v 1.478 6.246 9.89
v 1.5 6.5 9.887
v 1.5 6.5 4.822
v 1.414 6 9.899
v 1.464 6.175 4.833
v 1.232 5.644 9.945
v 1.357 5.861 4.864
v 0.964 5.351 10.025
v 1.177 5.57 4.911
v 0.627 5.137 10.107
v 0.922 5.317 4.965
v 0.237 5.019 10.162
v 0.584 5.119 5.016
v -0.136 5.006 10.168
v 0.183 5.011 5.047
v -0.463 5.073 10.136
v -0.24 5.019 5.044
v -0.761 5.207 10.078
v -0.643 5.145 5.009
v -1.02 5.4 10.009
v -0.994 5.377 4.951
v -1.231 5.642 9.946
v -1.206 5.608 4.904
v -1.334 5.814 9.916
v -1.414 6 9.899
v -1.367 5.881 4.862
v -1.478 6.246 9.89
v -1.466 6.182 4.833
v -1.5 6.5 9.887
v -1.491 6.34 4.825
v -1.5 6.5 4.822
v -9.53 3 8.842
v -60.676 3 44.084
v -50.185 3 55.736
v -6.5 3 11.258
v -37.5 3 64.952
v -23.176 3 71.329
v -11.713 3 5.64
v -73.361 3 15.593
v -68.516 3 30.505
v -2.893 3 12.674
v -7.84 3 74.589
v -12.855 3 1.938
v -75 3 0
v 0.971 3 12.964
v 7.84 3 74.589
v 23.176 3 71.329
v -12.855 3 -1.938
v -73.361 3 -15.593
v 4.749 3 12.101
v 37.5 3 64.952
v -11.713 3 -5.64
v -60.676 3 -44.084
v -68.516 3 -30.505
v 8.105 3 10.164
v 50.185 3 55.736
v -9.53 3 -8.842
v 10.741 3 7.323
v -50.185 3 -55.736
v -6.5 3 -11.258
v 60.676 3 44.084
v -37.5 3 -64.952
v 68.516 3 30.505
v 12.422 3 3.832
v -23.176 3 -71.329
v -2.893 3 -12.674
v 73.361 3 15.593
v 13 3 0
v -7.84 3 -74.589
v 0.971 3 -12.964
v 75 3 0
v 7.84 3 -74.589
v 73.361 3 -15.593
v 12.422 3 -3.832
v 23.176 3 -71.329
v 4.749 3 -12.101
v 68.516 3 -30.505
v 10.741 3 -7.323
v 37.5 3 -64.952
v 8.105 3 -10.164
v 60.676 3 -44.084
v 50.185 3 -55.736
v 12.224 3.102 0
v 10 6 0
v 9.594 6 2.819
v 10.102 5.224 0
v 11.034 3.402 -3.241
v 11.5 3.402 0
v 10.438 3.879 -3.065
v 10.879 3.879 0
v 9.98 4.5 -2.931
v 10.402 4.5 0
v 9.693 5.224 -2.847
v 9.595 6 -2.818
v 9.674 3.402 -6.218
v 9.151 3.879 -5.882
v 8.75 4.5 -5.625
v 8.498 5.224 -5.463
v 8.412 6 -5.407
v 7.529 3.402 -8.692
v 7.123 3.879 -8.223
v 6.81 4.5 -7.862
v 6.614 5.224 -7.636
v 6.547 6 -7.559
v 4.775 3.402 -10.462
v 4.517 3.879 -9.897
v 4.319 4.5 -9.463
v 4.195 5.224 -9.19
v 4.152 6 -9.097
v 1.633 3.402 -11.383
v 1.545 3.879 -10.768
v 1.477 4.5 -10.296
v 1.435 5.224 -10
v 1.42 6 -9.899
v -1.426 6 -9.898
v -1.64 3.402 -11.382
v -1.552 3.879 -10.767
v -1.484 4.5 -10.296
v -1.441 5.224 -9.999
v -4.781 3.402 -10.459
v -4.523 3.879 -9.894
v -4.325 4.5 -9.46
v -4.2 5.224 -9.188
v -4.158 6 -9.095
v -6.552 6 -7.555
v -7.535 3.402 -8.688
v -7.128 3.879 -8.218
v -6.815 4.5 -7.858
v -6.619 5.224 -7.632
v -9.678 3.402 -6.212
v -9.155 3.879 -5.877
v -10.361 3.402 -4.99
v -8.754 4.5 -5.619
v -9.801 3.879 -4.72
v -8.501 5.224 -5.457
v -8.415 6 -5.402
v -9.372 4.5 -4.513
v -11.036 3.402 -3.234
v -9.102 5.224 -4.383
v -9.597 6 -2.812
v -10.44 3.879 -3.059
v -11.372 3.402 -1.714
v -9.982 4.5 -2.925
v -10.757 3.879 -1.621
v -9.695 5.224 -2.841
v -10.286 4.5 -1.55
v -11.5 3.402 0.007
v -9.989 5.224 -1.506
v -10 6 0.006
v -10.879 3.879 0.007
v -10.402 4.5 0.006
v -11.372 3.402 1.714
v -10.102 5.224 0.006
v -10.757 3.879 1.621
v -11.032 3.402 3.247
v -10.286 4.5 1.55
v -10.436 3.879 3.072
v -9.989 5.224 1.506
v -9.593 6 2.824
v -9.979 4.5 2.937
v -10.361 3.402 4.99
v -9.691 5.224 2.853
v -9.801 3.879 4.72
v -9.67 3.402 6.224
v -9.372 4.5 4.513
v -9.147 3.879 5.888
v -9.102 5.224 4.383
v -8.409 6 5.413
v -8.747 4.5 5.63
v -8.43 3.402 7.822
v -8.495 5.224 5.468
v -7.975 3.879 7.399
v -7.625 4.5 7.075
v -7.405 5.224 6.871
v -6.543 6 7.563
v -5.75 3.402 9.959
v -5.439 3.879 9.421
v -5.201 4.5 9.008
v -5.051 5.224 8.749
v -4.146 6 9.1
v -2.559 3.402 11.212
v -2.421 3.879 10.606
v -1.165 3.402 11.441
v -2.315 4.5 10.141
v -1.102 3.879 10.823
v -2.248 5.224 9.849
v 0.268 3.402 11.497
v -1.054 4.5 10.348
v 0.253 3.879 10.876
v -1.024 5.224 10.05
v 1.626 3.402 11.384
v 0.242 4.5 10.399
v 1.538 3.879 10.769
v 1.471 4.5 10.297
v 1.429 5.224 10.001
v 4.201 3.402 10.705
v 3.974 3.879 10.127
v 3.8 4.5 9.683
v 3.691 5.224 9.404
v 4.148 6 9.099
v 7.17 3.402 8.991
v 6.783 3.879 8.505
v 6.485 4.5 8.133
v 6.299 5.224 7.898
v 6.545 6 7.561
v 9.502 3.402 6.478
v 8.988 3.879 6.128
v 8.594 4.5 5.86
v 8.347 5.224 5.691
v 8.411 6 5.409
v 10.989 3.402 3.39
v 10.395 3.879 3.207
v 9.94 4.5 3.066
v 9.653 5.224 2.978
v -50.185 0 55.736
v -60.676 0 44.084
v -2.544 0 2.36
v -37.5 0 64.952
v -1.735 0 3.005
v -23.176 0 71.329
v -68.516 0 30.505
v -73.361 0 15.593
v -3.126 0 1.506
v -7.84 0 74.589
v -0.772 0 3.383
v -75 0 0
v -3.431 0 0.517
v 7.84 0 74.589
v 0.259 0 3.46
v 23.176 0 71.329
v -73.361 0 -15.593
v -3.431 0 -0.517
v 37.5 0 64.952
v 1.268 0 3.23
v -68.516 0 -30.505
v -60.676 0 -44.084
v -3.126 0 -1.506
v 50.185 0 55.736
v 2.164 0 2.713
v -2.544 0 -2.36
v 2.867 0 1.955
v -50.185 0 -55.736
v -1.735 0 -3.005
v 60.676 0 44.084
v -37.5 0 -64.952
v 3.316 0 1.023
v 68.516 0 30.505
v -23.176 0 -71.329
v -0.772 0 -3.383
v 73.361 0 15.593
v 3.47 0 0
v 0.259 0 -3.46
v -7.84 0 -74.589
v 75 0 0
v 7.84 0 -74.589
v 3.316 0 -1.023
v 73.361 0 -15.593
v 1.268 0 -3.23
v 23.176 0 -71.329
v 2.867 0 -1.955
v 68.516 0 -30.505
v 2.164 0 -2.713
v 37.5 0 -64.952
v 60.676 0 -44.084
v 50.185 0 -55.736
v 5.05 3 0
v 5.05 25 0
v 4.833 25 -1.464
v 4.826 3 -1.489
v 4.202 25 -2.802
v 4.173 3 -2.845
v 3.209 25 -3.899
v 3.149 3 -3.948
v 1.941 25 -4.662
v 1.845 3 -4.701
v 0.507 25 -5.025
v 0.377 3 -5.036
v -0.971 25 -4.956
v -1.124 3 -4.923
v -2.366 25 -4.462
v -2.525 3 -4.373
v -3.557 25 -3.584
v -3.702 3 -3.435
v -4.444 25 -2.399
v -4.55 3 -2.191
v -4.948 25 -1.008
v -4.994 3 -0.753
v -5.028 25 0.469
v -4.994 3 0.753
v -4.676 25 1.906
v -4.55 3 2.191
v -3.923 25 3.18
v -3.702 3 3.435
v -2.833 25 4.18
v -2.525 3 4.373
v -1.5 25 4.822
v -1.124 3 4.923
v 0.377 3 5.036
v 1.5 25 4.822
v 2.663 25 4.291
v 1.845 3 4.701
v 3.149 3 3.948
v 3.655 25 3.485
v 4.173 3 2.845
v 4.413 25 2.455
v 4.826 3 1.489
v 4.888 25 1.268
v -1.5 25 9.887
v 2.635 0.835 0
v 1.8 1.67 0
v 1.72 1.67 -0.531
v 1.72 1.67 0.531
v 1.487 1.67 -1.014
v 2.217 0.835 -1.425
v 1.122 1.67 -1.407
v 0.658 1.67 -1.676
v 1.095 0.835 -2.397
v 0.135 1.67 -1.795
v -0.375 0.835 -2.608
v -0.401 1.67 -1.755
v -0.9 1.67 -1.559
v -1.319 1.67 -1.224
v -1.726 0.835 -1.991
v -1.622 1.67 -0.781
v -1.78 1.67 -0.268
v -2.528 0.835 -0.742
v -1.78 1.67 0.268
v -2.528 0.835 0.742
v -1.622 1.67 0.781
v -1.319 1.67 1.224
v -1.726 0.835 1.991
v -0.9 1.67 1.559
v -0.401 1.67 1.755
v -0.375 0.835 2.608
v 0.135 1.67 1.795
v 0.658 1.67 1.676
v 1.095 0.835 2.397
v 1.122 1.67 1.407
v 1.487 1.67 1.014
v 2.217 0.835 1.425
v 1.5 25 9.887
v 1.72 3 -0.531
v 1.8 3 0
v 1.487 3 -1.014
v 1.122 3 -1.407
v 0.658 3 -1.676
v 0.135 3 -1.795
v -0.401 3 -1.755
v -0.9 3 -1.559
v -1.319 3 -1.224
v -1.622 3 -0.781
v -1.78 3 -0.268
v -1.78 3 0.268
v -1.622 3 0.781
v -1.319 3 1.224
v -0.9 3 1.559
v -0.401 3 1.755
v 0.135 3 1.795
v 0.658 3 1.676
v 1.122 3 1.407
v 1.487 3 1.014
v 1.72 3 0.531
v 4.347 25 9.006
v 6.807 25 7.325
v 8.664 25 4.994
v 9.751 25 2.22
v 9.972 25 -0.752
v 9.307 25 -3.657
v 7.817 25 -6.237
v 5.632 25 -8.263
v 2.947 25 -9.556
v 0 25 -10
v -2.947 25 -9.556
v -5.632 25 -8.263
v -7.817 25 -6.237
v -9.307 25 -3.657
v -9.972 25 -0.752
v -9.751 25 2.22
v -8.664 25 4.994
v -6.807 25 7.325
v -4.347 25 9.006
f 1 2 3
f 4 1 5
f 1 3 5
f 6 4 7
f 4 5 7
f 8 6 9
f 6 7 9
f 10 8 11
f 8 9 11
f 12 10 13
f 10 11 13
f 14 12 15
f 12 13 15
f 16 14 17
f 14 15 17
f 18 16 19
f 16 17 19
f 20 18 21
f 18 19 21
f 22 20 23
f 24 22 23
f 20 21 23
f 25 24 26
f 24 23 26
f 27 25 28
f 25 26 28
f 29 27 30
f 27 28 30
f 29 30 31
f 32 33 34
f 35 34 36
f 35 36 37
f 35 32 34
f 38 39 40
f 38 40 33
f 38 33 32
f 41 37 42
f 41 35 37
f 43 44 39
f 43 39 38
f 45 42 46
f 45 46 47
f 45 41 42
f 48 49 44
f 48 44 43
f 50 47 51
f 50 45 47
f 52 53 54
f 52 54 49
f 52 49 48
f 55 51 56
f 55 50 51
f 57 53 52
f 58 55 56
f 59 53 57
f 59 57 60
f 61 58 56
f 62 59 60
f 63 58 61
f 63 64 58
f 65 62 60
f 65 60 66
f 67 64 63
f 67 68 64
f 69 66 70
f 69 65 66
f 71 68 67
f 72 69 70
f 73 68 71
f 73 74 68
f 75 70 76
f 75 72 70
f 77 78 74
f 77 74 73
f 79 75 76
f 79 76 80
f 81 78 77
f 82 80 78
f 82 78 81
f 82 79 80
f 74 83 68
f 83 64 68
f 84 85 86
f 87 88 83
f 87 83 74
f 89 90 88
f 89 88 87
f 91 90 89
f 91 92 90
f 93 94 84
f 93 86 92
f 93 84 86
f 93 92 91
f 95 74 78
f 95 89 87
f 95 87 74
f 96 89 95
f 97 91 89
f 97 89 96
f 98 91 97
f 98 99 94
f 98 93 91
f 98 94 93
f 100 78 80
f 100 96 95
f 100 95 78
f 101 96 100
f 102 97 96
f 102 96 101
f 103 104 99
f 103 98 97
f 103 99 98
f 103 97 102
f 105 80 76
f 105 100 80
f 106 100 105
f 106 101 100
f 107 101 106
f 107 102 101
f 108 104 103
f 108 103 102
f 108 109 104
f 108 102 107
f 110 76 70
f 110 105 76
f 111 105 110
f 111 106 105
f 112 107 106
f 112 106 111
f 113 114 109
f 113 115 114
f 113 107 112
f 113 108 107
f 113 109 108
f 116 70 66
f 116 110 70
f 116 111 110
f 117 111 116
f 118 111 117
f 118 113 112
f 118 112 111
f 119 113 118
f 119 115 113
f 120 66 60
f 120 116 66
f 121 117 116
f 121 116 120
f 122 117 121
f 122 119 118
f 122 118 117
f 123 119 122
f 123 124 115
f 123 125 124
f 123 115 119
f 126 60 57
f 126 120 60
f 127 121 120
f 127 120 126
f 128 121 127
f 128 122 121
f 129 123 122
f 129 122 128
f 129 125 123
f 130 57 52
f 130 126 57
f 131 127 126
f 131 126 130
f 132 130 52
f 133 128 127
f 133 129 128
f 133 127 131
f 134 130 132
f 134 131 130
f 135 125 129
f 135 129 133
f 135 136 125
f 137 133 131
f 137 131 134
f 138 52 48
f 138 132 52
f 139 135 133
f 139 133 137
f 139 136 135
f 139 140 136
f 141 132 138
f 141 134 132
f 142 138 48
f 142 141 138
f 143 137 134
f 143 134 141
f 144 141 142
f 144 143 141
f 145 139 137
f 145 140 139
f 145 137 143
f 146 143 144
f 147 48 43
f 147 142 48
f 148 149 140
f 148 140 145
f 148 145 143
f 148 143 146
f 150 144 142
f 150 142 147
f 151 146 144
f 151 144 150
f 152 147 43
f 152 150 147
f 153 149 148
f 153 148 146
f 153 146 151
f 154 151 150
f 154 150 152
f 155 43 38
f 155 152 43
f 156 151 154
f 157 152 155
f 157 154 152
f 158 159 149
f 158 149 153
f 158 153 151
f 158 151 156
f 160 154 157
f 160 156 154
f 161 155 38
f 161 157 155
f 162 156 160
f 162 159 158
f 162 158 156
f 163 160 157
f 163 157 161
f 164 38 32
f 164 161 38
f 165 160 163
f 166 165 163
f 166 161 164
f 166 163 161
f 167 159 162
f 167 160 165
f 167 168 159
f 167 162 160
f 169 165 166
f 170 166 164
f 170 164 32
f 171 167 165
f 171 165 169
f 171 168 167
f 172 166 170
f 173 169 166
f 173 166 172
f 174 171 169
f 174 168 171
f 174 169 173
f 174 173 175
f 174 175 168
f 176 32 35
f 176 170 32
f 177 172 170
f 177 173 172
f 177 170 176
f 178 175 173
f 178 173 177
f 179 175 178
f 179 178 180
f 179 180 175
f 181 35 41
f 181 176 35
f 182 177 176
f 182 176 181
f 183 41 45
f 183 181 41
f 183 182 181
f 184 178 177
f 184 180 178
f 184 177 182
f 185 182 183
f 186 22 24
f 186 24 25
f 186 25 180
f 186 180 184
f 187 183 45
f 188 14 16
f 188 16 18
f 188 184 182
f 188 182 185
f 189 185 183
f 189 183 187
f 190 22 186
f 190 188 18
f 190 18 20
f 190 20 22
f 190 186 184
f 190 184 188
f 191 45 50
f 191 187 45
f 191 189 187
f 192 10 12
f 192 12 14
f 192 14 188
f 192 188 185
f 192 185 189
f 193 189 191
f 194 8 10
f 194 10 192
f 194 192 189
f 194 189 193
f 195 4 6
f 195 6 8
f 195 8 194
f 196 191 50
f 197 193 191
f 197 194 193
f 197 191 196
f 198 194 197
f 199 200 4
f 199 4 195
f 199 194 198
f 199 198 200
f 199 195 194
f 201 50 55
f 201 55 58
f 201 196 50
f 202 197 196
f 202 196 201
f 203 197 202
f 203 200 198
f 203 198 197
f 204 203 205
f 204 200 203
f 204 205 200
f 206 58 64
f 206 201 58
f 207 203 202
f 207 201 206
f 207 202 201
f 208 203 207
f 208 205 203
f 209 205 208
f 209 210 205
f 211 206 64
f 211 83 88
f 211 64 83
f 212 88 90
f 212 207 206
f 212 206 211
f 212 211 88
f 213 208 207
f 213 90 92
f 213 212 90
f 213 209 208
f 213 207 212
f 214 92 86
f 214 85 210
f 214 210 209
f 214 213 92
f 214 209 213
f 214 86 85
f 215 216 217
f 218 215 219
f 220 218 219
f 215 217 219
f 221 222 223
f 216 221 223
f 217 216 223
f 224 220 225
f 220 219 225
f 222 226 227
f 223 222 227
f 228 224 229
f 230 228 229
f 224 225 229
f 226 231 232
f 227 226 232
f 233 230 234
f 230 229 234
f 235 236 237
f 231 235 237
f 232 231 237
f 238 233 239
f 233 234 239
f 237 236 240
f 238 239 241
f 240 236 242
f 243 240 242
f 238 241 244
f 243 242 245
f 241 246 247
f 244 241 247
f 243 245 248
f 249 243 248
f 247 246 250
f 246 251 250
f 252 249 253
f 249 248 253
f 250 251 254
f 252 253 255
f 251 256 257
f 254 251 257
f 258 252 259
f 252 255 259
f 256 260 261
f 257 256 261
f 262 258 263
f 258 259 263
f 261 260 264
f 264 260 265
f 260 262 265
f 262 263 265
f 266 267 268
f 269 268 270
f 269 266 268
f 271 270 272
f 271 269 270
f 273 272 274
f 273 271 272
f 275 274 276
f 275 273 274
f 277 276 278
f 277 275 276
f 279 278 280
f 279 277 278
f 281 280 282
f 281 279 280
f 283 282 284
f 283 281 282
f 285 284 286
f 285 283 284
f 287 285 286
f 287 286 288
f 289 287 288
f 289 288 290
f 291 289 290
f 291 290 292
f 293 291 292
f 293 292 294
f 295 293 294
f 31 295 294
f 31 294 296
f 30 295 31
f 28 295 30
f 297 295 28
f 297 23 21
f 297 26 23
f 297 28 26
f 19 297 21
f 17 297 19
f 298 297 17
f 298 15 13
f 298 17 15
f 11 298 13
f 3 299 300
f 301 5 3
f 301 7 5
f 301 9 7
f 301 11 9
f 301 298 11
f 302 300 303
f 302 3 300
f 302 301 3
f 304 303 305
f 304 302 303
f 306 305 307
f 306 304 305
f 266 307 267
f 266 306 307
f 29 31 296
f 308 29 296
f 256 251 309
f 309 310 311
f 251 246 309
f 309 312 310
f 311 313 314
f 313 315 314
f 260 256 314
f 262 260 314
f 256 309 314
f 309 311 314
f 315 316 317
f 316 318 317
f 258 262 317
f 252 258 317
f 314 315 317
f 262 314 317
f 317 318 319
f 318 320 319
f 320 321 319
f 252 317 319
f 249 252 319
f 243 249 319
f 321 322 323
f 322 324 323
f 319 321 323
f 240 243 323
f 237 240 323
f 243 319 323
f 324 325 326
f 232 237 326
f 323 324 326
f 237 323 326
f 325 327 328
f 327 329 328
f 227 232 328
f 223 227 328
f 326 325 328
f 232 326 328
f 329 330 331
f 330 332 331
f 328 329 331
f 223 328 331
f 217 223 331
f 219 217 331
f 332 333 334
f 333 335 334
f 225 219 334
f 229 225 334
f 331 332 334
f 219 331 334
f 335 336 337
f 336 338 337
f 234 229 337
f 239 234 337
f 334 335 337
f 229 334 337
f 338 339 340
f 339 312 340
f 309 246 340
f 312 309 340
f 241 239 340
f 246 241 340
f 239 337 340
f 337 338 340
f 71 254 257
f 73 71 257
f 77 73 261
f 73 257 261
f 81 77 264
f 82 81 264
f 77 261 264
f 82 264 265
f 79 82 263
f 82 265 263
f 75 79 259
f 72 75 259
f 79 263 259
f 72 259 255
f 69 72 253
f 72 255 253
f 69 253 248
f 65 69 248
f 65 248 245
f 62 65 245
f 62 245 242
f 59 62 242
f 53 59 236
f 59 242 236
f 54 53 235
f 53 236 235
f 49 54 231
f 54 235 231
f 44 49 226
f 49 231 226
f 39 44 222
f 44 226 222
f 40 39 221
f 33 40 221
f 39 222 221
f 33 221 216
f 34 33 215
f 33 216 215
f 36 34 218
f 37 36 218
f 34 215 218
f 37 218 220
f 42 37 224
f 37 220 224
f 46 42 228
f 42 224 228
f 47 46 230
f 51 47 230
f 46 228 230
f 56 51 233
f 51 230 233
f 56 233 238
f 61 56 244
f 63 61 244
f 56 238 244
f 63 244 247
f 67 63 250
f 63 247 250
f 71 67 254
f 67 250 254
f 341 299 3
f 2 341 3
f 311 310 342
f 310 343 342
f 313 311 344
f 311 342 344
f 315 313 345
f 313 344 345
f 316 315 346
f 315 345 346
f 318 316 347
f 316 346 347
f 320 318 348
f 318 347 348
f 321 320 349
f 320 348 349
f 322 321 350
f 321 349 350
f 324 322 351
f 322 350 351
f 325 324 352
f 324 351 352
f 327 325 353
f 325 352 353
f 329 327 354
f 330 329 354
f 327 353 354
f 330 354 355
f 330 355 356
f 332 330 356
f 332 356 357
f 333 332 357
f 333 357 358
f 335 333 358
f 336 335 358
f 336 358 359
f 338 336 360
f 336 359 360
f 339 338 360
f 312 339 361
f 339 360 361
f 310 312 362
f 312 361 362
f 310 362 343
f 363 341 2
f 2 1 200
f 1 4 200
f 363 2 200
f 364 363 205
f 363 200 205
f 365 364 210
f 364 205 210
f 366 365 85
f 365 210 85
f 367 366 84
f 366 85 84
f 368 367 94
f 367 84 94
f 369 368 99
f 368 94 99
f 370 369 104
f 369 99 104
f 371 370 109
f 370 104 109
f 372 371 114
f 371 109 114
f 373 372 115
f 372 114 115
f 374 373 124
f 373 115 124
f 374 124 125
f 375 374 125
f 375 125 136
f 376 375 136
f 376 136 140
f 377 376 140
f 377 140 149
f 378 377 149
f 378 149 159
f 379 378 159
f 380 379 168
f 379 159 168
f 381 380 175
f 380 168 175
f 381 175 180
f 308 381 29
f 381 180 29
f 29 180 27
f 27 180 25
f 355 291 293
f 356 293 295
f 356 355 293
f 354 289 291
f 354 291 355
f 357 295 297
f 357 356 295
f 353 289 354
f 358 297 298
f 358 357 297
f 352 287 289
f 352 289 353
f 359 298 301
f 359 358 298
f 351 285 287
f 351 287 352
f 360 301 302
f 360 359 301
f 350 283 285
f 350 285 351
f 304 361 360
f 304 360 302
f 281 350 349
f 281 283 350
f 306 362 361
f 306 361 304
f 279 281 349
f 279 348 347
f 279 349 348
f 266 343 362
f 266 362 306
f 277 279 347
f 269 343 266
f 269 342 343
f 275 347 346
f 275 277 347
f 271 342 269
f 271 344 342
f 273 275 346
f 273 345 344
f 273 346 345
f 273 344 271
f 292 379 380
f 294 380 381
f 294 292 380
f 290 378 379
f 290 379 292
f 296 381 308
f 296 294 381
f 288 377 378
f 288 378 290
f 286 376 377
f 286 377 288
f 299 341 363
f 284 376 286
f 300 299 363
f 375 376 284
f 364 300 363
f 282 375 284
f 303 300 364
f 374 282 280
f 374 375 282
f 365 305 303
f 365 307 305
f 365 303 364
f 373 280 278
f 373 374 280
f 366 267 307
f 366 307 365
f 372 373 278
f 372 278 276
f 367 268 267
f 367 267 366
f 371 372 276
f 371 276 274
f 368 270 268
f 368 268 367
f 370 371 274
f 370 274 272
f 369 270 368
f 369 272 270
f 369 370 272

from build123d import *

# Parameters (mm, degrees)
SKETCH1_R                                            = 75
BOSS_EXTRUDE1_DEPTH                                  = 3
SKETCH2_R                                            = 10
SKETCH2_R_2                                          = 5.05
BOSS_EXTRUDE2_DEPTH                                  = 22
FILLET1_R                                            = 3
CUT_EXTRUDE1_DEPTH                                   = 76
CSK_FOR_M3_HEX_SOCKET_COUNTERSUNK_HEAD_S_D           = 3.6
CSK_FOR_M3_HEX_SOCKET_COUNTERSUNK_HEAD_S_CSINK_D     = 6.94
CSK_FOR_M3_HEX_SOCKET_COUNTERSUNK_HEAD_S_CSINK_ANGLE = 90


with BuildPart() as part:
    # Sketch1 → Boss-Extrude1 (new body)
    with BuildSketch(Plane(origin=(0, 0, 0), x_dir=(1, 0, 0), z_dir=(0, 1, 0))):
        Circle(SKETCH1_R)
    extrude(amount=BOSS_EXTRUDE1_DEPTH)

    # Sketch2 → Boss-Extrude2 (add)
    with BuildSketch(Plane(origin=(0, 3, 0), x_dir=(1, 0, 0), z_dir=(0, 1, 0))):
        Circle(SKETCH2_R)
        Circle(SKETCH2_R_2, mode=Mode.SUBTRACT)
    extrude(amount=BOSS_EXTRUDE2_DEPTH)

    # Fillet1
    fillet1_edges = [part.edges().sort_by_distance(p)[0] for p in [
        (-10, 3, 0),
    ]]
    fillet(fillet1_edges, radius=FILLET1_R)

    # Sketch3 → Cut-Extrude1 (cut, through all)
    with BuildSketch(Plane.XY):
        with BuildLine():
            Line((1.5, 25), (1.5, 6.5))
            ThreePointArc((1.5, 6.5), (0, 5), (-1.5, 6.5))
            Line((-1.5, 6.5), (-1.5, 25))
            ThreePointArc((-1.5, 25), (0, 26.5), (1.5, 25))
        make_face()
    extrude(amount=CUT_EXTRUDE1_DEPTH, mode=Mode.SUBTRACT)

    # CSK for M3 Hex Socket Countersunk Head Screw1 (through all)
    with Locations(Plane(origin=(0, 0, 0), x_dir=(-1, 0, 0), z_dir=(0, -1, 0))):
        with Locations((0, 0)):
            CounterSinkHole(CSK_FOR_M3_HEX_SOCKET_COUNTERSUNK_HEAD_S_D / 2, CSK_FOR_M3_HEX_SOCKET_COUNTERSUNK_HEAD_S_CSINK_D / 2, counter_sink_angle=CSK_FOR_M3_HEX_SOCKET_COUNTERSUNK_HEAD_S_CSINK_ANGLE)


solid = part.part
